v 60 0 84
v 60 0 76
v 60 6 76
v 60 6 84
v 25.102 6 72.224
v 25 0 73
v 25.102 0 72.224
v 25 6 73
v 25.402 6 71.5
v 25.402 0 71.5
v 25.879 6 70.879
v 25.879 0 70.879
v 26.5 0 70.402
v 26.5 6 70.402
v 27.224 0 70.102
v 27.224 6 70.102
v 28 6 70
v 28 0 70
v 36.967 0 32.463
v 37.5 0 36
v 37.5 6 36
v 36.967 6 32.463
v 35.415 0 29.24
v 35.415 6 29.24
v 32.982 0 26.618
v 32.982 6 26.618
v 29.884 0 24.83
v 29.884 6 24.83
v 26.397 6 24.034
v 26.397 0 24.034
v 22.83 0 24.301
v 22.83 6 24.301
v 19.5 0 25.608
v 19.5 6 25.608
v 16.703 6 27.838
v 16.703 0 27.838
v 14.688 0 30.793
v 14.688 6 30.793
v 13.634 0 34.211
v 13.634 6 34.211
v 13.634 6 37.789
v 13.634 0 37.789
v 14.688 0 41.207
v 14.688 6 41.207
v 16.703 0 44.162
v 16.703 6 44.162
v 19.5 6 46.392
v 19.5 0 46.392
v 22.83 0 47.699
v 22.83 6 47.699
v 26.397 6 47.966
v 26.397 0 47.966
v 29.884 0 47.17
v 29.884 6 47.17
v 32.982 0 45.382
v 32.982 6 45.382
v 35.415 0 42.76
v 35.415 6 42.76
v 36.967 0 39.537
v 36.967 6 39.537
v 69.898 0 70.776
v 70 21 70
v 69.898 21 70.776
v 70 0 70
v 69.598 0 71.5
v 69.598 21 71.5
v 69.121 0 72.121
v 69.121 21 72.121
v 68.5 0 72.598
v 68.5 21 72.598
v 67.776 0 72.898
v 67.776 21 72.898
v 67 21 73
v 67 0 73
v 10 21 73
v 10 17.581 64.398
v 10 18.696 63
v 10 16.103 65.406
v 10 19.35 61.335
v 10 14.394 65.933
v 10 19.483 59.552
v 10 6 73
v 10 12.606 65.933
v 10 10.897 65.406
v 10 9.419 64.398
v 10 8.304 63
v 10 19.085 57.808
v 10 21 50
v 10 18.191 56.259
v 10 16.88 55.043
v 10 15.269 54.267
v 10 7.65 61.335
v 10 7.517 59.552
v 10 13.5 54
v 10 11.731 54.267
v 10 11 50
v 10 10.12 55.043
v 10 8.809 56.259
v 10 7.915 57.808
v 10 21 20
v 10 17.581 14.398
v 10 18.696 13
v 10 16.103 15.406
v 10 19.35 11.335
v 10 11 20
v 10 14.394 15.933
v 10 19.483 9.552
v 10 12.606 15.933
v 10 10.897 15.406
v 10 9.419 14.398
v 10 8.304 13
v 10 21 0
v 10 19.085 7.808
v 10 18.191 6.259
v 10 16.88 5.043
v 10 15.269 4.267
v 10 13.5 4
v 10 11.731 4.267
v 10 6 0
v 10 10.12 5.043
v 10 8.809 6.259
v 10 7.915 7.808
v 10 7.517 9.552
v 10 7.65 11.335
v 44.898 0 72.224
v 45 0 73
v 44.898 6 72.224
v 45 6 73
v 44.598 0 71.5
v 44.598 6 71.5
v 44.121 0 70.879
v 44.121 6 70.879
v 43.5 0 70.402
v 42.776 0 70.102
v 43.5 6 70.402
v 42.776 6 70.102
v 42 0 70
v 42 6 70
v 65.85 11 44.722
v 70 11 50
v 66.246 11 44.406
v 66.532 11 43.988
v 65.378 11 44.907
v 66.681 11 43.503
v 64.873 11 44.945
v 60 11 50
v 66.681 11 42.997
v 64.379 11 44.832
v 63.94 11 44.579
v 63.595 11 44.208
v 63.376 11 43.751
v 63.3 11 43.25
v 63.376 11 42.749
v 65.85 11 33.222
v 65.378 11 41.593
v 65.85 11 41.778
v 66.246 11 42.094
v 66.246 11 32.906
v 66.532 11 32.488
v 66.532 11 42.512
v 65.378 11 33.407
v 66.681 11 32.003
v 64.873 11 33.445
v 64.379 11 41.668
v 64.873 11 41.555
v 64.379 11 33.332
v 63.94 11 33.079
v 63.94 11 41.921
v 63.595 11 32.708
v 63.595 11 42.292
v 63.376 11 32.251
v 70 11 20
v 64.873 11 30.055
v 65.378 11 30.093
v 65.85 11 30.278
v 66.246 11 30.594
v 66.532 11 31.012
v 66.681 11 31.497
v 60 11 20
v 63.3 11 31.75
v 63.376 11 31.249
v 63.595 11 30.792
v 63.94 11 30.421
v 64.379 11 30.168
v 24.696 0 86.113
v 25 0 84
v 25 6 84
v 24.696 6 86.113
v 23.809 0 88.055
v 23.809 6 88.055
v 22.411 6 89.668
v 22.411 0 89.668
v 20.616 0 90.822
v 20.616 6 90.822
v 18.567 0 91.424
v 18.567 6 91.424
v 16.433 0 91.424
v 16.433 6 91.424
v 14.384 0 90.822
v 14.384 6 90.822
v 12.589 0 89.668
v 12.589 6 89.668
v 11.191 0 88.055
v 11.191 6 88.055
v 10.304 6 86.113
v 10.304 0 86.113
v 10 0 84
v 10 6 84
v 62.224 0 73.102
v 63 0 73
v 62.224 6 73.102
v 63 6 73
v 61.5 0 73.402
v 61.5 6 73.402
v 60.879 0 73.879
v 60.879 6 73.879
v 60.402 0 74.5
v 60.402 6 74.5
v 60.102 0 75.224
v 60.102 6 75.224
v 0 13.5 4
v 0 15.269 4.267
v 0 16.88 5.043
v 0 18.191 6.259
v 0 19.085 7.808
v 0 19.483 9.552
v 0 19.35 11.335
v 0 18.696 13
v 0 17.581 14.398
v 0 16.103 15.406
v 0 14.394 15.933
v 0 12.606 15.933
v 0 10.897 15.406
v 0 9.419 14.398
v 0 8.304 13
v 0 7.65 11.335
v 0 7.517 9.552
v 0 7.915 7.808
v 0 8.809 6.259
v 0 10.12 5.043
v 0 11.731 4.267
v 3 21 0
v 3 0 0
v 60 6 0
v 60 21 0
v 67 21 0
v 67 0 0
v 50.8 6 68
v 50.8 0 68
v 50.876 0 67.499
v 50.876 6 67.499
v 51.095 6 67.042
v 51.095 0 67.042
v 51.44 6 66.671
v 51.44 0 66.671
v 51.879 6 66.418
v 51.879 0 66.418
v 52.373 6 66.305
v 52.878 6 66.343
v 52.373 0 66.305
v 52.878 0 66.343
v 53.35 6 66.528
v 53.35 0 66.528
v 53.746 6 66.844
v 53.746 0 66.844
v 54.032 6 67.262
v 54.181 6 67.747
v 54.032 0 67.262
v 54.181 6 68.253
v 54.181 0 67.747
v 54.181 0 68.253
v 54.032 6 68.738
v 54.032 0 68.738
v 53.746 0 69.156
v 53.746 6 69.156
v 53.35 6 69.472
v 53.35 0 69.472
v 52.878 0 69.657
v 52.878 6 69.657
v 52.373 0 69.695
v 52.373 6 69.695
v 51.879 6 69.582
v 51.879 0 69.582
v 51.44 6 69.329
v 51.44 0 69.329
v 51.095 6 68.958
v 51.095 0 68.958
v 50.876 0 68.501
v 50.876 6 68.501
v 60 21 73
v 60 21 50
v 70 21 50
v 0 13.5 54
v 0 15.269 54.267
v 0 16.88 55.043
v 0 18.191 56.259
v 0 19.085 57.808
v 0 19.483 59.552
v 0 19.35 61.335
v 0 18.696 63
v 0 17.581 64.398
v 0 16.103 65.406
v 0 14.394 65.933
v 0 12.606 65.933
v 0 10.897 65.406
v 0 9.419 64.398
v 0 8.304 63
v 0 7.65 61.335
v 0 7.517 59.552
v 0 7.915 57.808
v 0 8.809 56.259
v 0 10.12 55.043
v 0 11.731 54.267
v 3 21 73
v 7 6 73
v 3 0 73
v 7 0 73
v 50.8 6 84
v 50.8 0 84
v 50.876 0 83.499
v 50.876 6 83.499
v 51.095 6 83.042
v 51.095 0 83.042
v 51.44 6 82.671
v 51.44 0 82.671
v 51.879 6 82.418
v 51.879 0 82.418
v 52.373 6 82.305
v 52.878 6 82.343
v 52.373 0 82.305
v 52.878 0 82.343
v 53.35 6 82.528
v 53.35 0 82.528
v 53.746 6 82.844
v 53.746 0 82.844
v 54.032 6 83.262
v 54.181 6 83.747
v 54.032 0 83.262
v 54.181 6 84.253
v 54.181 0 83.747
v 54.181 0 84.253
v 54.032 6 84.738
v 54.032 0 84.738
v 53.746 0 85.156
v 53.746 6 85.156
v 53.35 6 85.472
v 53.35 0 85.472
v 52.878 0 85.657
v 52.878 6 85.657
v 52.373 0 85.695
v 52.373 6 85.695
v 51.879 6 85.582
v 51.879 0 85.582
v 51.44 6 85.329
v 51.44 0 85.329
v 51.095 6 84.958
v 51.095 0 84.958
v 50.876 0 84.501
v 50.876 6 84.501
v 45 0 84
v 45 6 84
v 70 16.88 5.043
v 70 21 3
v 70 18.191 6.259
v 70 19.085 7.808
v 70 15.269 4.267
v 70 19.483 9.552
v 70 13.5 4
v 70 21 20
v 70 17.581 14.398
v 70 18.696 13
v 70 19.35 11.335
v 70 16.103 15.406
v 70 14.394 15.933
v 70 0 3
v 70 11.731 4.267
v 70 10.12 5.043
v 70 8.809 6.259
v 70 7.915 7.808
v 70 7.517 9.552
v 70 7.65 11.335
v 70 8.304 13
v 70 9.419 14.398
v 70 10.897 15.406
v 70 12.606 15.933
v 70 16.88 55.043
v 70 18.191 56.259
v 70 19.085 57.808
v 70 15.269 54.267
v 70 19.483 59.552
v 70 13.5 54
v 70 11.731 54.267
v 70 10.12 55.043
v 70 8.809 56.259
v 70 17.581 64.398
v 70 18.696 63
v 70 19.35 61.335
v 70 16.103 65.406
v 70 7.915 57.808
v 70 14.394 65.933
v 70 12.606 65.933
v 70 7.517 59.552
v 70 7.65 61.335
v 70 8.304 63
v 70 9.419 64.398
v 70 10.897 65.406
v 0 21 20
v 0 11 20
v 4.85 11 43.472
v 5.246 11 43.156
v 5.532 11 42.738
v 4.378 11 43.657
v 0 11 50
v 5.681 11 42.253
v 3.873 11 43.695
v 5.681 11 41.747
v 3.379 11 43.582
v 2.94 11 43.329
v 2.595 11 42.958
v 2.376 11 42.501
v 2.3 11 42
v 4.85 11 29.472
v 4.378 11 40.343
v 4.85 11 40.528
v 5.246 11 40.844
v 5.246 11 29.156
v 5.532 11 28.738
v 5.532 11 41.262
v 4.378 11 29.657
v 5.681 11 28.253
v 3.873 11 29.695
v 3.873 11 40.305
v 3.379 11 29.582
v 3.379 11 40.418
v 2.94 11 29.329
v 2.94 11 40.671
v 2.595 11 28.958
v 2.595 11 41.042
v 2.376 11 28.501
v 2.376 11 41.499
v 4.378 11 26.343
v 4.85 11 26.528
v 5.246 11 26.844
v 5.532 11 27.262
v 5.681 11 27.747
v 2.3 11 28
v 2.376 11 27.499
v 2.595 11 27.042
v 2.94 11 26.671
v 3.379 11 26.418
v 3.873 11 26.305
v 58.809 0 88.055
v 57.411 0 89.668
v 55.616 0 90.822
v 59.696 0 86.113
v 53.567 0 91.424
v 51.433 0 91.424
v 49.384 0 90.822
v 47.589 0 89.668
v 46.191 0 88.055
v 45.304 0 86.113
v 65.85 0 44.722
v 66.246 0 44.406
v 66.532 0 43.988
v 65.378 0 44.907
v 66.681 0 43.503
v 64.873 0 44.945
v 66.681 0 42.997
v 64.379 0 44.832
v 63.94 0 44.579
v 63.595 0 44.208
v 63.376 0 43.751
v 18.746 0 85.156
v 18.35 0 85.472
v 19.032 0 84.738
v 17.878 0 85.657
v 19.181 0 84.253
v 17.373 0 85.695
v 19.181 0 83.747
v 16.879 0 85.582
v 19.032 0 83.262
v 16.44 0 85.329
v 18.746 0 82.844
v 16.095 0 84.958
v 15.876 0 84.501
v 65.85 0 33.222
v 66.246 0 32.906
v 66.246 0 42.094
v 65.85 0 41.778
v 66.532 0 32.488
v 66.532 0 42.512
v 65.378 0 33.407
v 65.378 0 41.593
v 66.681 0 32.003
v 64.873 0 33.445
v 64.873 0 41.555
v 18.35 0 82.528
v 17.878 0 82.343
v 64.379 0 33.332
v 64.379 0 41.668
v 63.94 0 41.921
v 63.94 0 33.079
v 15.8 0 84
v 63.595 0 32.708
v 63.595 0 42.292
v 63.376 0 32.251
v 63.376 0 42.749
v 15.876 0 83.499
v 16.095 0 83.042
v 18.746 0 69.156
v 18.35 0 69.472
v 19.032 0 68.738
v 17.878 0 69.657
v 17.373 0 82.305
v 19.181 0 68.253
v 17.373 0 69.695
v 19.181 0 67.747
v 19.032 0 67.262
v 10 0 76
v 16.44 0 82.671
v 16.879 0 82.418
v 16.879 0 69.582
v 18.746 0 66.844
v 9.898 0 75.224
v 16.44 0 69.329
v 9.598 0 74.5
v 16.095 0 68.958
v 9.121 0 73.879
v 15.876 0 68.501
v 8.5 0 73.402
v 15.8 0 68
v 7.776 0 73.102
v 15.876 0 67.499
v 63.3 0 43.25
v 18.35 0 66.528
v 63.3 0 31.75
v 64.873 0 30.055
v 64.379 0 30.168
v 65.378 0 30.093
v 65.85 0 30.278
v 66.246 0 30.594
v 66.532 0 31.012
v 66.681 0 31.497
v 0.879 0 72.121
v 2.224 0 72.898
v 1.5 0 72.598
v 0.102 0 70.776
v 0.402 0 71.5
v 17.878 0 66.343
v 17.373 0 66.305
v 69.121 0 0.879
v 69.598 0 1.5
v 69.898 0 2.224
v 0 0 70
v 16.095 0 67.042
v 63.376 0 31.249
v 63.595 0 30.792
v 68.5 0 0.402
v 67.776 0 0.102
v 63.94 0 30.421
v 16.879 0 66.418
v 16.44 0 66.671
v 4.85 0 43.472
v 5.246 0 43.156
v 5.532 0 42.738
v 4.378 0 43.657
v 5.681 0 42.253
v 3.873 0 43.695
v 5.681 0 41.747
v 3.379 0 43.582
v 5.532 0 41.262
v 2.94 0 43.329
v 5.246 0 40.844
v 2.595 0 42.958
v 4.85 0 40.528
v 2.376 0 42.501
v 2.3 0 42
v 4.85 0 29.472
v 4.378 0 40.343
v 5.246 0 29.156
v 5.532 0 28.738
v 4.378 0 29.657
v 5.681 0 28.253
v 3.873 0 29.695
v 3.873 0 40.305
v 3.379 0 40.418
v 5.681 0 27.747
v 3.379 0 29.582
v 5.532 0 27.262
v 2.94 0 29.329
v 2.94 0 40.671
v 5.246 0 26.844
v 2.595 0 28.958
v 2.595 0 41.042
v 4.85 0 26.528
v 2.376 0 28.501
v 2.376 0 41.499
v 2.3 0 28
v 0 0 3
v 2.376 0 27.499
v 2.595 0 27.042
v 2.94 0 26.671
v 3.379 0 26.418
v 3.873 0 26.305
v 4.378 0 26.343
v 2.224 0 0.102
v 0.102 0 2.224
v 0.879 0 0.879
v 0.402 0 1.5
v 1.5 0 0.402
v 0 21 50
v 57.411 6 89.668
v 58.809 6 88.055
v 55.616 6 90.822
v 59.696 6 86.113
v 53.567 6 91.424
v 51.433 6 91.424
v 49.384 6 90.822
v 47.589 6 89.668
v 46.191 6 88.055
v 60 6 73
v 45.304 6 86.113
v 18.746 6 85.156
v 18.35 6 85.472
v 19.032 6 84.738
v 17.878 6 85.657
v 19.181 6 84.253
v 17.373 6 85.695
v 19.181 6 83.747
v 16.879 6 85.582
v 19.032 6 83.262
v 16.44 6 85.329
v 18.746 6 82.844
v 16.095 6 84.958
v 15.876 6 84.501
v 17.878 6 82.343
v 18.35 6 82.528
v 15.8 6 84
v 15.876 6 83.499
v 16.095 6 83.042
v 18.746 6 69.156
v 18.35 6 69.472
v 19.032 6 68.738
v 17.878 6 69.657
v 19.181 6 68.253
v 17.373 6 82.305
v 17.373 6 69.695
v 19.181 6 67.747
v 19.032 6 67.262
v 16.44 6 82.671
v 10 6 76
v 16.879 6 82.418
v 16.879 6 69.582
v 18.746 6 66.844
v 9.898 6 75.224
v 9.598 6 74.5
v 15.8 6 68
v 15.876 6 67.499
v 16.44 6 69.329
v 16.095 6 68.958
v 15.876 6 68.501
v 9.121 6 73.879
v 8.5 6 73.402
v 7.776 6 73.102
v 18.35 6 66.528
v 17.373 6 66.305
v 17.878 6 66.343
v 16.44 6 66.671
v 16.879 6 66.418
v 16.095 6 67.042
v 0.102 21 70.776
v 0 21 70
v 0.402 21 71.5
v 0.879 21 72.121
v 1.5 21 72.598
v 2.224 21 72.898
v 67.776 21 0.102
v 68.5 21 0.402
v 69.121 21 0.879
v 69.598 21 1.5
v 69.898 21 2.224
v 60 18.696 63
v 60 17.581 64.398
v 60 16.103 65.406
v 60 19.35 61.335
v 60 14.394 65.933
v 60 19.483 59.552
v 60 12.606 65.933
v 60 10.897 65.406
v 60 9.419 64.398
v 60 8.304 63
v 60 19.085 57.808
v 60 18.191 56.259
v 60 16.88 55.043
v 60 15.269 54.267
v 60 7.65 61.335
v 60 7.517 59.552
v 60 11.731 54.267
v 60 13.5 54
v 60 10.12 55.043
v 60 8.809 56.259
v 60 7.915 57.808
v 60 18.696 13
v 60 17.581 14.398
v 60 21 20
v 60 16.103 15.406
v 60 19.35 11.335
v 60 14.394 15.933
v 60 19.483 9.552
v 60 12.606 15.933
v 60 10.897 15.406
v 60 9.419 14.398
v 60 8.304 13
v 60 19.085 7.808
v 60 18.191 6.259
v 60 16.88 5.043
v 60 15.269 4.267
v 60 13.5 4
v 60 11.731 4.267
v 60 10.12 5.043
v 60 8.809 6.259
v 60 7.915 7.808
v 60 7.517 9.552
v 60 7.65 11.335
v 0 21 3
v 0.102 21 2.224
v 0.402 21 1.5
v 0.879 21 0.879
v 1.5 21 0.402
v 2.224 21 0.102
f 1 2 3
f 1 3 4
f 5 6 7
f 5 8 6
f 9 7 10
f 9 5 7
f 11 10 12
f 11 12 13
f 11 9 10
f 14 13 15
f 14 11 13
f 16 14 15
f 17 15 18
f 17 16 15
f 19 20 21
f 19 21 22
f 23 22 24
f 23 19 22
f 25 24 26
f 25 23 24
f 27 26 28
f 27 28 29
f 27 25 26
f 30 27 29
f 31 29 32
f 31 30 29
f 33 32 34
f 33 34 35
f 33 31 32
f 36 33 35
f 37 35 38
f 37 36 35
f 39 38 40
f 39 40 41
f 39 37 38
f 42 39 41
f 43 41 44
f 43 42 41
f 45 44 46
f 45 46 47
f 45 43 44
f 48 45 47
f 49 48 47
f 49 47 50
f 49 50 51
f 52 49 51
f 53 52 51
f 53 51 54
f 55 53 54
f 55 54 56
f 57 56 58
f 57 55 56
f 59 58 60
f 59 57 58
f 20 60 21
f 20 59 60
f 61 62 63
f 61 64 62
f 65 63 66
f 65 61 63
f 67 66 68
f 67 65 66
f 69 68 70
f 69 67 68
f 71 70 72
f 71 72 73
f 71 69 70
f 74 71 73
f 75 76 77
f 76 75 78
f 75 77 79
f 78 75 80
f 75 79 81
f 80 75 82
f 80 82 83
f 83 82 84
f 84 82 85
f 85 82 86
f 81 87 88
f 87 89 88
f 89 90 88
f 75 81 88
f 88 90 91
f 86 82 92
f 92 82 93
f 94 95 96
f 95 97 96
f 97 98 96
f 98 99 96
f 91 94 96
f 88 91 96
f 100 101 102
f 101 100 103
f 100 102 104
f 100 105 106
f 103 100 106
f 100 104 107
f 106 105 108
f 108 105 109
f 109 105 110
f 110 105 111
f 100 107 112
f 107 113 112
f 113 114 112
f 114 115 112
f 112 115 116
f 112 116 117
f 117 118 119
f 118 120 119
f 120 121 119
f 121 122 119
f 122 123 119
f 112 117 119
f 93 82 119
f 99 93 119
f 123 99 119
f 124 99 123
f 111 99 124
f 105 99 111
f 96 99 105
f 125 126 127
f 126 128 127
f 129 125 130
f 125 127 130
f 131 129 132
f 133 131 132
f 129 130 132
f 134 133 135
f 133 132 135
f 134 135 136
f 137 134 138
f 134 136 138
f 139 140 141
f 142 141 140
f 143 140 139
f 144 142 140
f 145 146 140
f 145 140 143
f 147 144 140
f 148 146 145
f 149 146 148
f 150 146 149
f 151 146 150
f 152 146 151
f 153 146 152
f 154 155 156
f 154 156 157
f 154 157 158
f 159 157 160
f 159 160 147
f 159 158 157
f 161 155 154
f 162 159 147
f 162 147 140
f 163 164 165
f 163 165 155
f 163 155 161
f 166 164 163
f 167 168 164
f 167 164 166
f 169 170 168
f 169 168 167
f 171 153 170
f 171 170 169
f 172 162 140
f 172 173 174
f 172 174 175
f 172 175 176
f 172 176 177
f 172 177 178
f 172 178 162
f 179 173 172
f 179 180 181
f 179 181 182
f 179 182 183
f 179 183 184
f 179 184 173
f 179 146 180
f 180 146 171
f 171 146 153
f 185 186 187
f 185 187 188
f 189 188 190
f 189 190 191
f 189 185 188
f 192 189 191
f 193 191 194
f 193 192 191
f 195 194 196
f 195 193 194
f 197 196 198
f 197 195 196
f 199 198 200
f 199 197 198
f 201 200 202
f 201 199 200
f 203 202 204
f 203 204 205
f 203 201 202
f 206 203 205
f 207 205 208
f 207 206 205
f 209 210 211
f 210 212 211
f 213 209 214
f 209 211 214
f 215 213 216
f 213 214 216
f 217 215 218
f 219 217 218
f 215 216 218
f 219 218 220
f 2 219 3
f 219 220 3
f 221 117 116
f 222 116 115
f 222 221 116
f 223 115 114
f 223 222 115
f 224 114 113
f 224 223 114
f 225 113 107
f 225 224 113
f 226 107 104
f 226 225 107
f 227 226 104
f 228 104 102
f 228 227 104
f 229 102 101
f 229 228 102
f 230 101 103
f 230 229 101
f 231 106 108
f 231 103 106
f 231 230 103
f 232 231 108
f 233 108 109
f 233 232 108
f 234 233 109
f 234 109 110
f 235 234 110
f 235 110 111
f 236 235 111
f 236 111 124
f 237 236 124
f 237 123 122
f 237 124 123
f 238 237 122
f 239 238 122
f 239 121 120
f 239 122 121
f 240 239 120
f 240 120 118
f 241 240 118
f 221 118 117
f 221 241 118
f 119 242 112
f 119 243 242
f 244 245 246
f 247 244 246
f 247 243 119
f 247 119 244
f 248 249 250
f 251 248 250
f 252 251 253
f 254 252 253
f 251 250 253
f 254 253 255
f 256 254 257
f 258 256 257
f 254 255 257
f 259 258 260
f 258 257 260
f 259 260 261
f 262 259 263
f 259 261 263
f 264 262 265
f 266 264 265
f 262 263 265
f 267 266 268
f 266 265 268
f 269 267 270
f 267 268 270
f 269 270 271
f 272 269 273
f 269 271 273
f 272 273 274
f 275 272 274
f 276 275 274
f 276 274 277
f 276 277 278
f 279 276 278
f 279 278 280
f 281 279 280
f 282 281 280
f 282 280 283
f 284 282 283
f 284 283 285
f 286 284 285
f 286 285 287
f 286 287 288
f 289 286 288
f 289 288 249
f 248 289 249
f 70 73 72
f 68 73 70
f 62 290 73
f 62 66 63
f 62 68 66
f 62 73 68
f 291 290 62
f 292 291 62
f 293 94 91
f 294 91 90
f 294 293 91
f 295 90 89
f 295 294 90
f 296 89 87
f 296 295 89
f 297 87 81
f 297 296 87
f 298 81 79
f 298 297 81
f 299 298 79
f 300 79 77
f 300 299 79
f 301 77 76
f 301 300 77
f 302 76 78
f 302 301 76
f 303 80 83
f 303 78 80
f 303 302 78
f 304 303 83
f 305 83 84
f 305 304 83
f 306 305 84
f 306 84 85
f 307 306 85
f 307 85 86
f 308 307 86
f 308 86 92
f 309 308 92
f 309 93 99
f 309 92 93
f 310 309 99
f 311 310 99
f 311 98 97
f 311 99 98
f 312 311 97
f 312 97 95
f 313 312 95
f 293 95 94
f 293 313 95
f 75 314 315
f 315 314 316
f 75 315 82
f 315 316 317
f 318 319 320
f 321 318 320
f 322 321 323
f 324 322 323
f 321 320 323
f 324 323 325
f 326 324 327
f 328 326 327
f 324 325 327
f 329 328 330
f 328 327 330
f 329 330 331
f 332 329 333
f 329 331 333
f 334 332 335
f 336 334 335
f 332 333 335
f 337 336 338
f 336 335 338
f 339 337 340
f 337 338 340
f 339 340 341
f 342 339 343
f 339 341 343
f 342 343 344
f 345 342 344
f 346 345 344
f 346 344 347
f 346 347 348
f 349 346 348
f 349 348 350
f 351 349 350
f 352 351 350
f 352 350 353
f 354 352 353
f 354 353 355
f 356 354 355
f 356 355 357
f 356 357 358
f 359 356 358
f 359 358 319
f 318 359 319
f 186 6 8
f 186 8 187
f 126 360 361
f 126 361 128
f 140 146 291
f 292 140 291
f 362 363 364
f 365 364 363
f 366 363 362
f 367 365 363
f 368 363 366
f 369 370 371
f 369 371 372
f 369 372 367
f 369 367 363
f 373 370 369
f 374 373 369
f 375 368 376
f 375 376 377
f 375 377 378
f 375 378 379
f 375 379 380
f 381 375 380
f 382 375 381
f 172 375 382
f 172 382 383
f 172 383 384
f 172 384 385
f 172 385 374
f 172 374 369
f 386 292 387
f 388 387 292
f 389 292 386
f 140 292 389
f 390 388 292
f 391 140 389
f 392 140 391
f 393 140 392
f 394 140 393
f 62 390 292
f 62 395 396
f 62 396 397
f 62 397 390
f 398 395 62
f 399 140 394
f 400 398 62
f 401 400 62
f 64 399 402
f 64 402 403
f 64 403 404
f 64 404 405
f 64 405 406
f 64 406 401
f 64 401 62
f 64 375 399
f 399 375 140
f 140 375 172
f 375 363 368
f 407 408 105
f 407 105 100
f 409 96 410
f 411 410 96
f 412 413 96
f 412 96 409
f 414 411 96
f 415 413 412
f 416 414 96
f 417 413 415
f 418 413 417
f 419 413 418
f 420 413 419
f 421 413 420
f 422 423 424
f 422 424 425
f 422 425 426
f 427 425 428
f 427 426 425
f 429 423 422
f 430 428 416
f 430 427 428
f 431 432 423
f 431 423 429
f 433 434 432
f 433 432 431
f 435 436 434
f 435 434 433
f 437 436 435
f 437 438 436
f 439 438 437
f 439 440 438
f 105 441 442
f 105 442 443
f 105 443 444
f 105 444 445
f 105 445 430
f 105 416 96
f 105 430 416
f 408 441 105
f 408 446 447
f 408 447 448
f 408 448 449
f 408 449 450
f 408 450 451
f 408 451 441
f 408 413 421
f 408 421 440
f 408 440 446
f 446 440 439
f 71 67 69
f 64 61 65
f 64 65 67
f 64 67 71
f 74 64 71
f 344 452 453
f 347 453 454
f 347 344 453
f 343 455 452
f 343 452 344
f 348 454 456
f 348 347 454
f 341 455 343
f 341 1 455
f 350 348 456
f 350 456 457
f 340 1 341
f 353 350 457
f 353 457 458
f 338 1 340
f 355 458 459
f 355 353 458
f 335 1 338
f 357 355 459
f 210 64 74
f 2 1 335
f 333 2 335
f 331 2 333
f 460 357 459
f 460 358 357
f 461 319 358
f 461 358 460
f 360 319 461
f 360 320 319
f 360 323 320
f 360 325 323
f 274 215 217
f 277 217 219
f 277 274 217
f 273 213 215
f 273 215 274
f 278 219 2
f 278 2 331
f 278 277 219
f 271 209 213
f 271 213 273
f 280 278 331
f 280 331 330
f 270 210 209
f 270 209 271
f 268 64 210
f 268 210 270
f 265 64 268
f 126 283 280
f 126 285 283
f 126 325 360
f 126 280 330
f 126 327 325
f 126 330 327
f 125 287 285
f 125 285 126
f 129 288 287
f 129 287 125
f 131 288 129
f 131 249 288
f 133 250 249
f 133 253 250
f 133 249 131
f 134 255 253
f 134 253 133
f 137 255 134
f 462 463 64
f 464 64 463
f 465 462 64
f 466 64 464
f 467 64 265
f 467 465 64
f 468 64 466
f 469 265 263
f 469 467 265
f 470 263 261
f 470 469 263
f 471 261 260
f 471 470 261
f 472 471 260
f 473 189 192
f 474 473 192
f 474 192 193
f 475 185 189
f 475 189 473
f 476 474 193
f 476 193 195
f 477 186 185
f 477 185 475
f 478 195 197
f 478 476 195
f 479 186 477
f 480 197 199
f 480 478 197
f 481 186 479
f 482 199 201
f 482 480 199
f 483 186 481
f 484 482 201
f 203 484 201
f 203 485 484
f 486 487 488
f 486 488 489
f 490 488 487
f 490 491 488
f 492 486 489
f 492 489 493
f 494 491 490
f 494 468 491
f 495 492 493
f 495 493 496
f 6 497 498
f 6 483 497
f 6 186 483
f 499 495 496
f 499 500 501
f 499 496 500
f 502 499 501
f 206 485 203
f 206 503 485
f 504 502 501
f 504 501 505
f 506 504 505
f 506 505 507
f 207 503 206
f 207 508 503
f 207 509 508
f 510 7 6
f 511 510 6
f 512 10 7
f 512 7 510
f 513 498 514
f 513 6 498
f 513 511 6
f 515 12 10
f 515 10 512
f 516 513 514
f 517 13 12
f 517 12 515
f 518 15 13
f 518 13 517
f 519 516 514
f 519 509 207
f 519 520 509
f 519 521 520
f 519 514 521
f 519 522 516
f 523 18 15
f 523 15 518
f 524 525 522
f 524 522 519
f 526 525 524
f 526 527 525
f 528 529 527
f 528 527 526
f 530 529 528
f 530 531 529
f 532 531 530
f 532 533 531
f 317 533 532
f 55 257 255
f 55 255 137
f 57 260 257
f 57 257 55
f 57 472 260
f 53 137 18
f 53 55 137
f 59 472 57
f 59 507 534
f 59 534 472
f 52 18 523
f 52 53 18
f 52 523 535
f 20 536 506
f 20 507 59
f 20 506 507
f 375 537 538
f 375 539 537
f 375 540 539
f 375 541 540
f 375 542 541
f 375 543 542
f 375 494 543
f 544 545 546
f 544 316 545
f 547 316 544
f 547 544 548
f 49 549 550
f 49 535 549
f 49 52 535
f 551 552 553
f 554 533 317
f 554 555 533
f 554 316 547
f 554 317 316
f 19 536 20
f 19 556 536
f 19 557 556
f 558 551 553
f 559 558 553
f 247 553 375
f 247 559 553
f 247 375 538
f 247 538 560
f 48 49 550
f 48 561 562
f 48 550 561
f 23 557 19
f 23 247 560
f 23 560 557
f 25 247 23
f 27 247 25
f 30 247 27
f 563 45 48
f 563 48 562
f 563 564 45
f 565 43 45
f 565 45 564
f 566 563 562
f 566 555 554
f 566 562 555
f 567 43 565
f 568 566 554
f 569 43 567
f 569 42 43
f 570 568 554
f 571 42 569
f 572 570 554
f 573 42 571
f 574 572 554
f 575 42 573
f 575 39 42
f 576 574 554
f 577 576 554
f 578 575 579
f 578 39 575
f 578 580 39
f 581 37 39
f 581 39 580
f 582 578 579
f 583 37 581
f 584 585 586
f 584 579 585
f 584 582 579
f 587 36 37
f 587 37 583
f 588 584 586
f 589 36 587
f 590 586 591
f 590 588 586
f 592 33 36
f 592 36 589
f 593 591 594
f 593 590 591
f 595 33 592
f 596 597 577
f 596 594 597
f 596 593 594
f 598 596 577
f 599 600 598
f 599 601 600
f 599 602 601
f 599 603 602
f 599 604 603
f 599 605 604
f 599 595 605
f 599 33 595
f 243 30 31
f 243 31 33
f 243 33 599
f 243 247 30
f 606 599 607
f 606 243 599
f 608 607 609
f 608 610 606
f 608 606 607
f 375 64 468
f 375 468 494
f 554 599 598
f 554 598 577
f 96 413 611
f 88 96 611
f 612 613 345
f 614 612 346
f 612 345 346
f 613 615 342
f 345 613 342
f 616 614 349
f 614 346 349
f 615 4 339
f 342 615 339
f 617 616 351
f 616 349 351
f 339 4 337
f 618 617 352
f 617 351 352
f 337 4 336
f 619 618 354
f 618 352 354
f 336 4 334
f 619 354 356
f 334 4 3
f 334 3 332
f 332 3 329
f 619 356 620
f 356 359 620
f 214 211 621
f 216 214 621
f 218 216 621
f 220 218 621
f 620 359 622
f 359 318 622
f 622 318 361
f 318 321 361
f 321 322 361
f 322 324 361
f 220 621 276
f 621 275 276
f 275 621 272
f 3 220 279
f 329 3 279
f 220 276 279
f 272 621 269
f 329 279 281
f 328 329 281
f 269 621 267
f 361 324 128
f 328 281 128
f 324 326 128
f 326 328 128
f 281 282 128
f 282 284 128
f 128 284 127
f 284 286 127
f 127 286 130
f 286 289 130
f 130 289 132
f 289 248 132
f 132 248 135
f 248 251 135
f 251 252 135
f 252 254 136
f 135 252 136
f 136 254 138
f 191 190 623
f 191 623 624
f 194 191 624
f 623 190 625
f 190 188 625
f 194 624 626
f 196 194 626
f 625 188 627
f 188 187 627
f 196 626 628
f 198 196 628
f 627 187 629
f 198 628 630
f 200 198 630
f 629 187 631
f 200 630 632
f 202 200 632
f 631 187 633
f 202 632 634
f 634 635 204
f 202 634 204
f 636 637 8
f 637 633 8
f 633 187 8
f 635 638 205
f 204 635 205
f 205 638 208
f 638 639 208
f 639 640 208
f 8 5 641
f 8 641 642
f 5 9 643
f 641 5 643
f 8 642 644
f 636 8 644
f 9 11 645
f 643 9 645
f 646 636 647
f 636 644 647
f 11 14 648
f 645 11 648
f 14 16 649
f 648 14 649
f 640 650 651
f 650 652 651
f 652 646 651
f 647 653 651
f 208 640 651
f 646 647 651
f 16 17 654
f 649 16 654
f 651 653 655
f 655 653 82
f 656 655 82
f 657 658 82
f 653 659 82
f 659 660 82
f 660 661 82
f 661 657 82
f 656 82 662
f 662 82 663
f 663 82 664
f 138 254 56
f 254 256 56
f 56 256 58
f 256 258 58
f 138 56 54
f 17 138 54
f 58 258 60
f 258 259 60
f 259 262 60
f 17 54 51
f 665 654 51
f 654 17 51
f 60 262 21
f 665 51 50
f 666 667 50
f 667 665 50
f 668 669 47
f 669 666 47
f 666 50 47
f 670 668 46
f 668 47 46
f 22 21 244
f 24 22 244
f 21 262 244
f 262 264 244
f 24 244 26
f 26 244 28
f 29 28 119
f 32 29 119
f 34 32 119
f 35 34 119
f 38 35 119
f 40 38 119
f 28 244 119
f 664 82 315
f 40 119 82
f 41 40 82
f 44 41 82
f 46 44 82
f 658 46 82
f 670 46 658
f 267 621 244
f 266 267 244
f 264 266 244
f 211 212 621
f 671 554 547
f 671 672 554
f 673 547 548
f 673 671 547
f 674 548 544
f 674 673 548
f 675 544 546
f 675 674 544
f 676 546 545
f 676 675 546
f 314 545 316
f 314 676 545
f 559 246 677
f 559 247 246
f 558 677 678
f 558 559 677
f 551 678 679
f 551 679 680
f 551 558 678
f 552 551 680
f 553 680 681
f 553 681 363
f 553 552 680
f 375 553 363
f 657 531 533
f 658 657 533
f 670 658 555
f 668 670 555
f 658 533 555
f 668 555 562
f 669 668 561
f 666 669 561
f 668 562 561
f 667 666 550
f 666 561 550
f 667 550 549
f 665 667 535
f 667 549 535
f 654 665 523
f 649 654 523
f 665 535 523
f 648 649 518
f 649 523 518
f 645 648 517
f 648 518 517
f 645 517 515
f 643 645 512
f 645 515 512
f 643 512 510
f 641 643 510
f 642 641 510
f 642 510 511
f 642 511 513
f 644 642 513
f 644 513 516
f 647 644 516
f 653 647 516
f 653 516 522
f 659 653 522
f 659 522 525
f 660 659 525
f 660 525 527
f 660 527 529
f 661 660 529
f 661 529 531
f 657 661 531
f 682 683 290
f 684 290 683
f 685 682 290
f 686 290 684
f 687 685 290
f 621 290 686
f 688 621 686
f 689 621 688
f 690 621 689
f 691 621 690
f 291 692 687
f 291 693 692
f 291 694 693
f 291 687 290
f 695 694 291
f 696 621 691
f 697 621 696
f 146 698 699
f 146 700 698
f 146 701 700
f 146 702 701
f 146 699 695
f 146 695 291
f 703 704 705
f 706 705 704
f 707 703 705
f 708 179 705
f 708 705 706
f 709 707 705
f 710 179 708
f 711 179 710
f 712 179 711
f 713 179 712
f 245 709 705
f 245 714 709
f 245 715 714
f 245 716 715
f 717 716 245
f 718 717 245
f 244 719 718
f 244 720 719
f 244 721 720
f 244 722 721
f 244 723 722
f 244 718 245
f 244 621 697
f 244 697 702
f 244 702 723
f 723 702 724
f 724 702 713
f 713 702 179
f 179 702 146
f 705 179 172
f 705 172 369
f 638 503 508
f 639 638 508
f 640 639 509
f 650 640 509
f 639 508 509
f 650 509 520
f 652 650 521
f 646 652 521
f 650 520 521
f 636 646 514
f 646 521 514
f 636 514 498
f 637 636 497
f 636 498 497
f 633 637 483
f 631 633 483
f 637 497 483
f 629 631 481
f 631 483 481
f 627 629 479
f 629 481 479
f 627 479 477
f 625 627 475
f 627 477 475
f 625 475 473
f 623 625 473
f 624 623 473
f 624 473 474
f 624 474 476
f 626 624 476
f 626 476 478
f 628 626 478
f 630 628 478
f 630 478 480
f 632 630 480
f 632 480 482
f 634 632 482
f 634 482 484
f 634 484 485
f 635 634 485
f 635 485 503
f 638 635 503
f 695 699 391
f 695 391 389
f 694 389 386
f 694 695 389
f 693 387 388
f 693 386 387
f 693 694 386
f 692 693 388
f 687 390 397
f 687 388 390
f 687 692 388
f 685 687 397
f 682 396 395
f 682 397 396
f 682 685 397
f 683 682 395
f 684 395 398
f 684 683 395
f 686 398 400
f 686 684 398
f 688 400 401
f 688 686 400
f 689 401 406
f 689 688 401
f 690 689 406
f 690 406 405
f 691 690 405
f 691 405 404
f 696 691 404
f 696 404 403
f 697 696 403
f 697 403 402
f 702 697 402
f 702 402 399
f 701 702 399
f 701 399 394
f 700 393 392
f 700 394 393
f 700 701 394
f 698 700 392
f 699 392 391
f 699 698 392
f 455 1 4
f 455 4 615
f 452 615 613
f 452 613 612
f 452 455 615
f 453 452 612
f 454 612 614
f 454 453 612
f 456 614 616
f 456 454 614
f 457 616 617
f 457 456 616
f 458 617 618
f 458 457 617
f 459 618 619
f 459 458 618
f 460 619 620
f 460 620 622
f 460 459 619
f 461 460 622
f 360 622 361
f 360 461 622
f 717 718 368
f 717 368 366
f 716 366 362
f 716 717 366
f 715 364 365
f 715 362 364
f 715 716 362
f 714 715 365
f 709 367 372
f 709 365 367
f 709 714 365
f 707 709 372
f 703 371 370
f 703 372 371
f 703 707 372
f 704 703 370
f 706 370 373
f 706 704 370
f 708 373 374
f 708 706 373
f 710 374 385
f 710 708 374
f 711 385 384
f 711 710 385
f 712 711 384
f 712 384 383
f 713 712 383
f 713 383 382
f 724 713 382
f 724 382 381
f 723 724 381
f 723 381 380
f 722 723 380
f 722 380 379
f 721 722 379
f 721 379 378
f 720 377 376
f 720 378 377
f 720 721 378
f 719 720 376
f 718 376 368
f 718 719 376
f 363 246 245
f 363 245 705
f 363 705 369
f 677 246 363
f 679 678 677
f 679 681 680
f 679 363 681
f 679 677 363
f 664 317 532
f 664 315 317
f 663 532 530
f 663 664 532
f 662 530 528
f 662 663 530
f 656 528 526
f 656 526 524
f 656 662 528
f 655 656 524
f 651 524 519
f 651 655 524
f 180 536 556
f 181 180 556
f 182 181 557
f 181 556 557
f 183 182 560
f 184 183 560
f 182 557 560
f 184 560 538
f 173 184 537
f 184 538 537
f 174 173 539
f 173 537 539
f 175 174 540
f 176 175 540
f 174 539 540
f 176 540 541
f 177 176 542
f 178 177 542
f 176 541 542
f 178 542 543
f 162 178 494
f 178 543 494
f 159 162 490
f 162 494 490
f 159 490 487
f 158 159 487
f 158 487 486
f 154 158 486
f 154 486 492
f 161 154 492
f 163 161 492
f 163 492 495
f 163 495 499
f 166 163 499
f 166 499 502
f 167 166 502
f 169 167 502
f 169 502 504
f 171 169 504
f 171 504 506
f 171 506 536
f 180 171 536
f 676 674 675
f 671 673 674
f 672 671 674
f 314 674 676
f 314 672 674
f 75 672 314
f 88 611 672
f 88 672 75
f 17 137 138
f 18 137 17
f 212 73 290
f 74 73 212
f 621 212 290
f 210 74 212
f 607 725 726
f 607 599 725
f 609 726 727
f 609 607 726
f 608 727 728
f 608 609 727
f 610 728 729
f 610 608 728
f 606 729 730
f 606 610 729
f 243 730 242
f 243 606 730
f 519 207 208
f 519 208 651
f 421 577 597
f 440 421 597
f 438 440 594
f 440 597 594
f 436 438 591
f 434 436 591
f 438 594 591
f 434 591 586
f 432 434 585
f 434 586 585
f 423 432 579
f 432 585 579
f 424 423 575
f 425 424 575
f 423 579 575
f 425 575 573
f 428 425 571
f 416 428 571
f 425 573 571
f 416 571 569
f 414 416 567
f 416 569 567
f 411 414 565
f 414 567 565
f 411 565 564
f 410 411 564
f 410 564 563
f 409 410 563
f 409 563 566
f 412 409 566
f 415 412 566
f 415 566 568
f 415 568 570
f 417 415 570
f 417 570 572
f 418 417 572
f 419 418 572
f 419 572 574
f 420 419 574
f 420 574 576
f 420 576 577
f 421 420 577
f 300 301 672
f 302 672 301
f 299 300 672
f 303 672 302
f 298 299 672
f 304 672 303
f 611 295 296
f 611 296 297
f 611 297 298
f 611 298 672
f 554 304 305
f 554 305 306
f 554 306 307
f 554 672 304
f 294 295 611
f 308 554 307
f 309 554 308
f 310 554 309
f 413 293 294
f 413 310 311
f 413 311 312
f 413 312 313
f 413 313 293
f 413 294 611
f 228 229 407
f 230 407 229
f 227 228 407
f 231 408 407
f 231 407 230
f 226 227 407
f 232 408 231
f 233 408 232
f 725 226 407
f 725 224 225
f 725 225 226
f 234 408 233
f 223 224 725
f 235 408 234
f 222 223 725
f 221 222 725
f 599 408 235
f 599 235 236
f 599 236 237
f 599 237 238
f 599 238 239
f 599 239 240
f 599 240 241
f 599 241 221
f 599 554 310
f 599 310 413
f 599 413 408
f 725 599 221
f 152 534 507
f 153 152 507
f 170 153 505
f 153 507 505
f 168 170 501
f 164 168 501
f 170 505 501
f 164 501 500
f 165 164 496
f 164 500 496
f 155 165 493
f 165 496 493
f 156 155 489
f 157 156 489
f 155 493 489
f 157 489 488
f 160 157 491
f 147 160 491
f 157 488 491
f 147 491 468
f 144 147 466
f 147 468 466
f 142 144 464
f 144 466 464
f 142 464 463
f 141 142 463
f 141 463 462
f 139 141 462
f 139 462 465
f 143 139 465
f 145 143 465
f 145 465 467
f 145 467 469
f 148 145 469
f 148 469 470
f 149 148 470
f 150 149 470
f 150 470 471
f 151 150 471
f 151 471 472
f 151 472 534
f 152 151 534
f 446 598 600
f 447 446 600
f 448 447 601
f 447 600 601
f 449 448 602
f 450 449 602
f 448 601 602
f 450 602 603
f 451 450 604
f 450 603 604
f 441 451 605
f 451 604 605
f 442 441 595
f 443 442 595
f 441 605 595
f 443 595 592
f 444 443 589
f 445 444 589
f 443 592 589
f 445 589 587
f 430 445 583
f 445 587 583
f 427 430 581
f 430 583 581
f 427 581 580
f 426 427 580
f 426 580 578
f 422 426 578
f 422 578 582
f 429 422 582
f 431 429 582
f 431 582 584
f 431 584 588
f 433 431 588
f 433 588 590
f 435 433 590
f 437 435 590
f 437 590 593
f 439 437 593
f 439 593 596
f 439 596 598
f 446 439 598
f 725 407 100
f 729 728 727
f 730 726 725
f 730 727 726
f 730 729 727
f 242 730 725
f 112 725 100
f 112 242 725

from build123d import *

# Parameters (mm, degrees)
ESQUISSE1_R             = 12
BOSS_EXTRU_1_DEPTH      = 6
ESQUISSE3_W             = 10
ESQUISSE3_H             = 73
BOSS_EXTRU_2_DEPTH      = 15
ESQUISSE4_R             = 6
ESQUISSE4_W             = 30
ESQUISSE4_H             = 10
ENL_V_MAT_EXTRU_1_DEPTH = 71
D_GAGEMENT_M32_D        = 3.4
D_GAGEMENT_M32_DEPTH    = 11
CONG_2_R                = 3


with BuildPart() as part:
    # Esquisse1 → Boss.-Extru.1 (new body)
    with BuildSketch(Plane(origin=(0, 0, 0), x_dir=(1, 0, 0), z_dir=(0, 1, 0))):
        with BuildLine():
            Line((0, 0), (70, 0))
            Line((70, 0), (70, -73))
            Line((70, -73), (60, -73))
            Line((60, -73), (60, -84))
            ThreePointArc((60, -84), (52.5, -91.5), (45, -84))
            Line((45, -84), (45, -70))
            Line((45, -70), (25, -70))
            Line((25, -70), (25, -84))
            ThreePointArc((25, -84), (17.5, -91.5), (10, -84))
            Line((10, -84), (10, -73))
            Line((10, -73), (0, -73))
            Line((0, -73), (0, 0))
        make_face()
        with Locations((25.5, -36)):
            Circle(ESQUISSE1_R, mode=Mode.SUBTRACT)
    extrude(amount=BOSS_EXTRU_1_DEPTH)

    # Esquisse3 → Boss.-Extru.2 (add)
    with BuildSketch(Plane(origin=(0, 6, 0), x_dir=(1, 0, 0), z_dir=(0, 1, 0))):
        with Locations((5, -36.5)):
            Rectangle(ESQUISSE3_W, ESQUISSE3_H)
        with Locations((65, -36.5)):
            Rectangle(ESQUISSE3_W, ESQUISSE3_H)
    extrude(amount=BOSS_EXTRU_2_DEPTH)

    # Esquisse4 → Enlèv. mat.-Extru.1 (cut, through all)
    with BuildSketch(Plane(origin=(0, 0, 0), x_dir=(0, 0, -1), z_dir=(1, 0, 0))):
        with Locations((-60, 13.5)):
            Circle(ESQUISSE4_R)
        with Locations((-10, 13.5)):
            Circle(ESQUISSE4_R)
        with Locations((-35, 16)):
            Rectangle(ESQUISSE4_W, ESQUISSE4_H)
    extrude(amount=ENL_V_MAT_EXTRU_1_DEPTH, mode=Mode.SUBTRACT)

    # Dégagement M32
    with Locations(Plane(origin=(0, 11, 0), x_dir=(1, 0, 0), z_dir=(0, 1, 0))):
        with Locations((4, -28), (4, -42), (17.5, -84), (52.5, -84), (17.5, -68), (52.5, -68), (65, -31.75), (65, -43.25)):
            Hole(D_GAGEMENT_M32_D / 2, depth=D_GAGEMENT_M32_DEPTH)

    # Congé2
    cong_2_edges = [part.edges().sort_by_distance(p)[0] for p in [
        (0, 10.5, 0),
        (70, 10.5, 0),
        (70, 10.5, 73),
        (60, 3, 73),
        (45, 3, 70),
        (25, 3, 70),
        (10, 3, 73),
        (0, 10.5, 73),
    ]]
    fillet(cong_2_edges, radius=CONG_2_R)


solid = part.part
